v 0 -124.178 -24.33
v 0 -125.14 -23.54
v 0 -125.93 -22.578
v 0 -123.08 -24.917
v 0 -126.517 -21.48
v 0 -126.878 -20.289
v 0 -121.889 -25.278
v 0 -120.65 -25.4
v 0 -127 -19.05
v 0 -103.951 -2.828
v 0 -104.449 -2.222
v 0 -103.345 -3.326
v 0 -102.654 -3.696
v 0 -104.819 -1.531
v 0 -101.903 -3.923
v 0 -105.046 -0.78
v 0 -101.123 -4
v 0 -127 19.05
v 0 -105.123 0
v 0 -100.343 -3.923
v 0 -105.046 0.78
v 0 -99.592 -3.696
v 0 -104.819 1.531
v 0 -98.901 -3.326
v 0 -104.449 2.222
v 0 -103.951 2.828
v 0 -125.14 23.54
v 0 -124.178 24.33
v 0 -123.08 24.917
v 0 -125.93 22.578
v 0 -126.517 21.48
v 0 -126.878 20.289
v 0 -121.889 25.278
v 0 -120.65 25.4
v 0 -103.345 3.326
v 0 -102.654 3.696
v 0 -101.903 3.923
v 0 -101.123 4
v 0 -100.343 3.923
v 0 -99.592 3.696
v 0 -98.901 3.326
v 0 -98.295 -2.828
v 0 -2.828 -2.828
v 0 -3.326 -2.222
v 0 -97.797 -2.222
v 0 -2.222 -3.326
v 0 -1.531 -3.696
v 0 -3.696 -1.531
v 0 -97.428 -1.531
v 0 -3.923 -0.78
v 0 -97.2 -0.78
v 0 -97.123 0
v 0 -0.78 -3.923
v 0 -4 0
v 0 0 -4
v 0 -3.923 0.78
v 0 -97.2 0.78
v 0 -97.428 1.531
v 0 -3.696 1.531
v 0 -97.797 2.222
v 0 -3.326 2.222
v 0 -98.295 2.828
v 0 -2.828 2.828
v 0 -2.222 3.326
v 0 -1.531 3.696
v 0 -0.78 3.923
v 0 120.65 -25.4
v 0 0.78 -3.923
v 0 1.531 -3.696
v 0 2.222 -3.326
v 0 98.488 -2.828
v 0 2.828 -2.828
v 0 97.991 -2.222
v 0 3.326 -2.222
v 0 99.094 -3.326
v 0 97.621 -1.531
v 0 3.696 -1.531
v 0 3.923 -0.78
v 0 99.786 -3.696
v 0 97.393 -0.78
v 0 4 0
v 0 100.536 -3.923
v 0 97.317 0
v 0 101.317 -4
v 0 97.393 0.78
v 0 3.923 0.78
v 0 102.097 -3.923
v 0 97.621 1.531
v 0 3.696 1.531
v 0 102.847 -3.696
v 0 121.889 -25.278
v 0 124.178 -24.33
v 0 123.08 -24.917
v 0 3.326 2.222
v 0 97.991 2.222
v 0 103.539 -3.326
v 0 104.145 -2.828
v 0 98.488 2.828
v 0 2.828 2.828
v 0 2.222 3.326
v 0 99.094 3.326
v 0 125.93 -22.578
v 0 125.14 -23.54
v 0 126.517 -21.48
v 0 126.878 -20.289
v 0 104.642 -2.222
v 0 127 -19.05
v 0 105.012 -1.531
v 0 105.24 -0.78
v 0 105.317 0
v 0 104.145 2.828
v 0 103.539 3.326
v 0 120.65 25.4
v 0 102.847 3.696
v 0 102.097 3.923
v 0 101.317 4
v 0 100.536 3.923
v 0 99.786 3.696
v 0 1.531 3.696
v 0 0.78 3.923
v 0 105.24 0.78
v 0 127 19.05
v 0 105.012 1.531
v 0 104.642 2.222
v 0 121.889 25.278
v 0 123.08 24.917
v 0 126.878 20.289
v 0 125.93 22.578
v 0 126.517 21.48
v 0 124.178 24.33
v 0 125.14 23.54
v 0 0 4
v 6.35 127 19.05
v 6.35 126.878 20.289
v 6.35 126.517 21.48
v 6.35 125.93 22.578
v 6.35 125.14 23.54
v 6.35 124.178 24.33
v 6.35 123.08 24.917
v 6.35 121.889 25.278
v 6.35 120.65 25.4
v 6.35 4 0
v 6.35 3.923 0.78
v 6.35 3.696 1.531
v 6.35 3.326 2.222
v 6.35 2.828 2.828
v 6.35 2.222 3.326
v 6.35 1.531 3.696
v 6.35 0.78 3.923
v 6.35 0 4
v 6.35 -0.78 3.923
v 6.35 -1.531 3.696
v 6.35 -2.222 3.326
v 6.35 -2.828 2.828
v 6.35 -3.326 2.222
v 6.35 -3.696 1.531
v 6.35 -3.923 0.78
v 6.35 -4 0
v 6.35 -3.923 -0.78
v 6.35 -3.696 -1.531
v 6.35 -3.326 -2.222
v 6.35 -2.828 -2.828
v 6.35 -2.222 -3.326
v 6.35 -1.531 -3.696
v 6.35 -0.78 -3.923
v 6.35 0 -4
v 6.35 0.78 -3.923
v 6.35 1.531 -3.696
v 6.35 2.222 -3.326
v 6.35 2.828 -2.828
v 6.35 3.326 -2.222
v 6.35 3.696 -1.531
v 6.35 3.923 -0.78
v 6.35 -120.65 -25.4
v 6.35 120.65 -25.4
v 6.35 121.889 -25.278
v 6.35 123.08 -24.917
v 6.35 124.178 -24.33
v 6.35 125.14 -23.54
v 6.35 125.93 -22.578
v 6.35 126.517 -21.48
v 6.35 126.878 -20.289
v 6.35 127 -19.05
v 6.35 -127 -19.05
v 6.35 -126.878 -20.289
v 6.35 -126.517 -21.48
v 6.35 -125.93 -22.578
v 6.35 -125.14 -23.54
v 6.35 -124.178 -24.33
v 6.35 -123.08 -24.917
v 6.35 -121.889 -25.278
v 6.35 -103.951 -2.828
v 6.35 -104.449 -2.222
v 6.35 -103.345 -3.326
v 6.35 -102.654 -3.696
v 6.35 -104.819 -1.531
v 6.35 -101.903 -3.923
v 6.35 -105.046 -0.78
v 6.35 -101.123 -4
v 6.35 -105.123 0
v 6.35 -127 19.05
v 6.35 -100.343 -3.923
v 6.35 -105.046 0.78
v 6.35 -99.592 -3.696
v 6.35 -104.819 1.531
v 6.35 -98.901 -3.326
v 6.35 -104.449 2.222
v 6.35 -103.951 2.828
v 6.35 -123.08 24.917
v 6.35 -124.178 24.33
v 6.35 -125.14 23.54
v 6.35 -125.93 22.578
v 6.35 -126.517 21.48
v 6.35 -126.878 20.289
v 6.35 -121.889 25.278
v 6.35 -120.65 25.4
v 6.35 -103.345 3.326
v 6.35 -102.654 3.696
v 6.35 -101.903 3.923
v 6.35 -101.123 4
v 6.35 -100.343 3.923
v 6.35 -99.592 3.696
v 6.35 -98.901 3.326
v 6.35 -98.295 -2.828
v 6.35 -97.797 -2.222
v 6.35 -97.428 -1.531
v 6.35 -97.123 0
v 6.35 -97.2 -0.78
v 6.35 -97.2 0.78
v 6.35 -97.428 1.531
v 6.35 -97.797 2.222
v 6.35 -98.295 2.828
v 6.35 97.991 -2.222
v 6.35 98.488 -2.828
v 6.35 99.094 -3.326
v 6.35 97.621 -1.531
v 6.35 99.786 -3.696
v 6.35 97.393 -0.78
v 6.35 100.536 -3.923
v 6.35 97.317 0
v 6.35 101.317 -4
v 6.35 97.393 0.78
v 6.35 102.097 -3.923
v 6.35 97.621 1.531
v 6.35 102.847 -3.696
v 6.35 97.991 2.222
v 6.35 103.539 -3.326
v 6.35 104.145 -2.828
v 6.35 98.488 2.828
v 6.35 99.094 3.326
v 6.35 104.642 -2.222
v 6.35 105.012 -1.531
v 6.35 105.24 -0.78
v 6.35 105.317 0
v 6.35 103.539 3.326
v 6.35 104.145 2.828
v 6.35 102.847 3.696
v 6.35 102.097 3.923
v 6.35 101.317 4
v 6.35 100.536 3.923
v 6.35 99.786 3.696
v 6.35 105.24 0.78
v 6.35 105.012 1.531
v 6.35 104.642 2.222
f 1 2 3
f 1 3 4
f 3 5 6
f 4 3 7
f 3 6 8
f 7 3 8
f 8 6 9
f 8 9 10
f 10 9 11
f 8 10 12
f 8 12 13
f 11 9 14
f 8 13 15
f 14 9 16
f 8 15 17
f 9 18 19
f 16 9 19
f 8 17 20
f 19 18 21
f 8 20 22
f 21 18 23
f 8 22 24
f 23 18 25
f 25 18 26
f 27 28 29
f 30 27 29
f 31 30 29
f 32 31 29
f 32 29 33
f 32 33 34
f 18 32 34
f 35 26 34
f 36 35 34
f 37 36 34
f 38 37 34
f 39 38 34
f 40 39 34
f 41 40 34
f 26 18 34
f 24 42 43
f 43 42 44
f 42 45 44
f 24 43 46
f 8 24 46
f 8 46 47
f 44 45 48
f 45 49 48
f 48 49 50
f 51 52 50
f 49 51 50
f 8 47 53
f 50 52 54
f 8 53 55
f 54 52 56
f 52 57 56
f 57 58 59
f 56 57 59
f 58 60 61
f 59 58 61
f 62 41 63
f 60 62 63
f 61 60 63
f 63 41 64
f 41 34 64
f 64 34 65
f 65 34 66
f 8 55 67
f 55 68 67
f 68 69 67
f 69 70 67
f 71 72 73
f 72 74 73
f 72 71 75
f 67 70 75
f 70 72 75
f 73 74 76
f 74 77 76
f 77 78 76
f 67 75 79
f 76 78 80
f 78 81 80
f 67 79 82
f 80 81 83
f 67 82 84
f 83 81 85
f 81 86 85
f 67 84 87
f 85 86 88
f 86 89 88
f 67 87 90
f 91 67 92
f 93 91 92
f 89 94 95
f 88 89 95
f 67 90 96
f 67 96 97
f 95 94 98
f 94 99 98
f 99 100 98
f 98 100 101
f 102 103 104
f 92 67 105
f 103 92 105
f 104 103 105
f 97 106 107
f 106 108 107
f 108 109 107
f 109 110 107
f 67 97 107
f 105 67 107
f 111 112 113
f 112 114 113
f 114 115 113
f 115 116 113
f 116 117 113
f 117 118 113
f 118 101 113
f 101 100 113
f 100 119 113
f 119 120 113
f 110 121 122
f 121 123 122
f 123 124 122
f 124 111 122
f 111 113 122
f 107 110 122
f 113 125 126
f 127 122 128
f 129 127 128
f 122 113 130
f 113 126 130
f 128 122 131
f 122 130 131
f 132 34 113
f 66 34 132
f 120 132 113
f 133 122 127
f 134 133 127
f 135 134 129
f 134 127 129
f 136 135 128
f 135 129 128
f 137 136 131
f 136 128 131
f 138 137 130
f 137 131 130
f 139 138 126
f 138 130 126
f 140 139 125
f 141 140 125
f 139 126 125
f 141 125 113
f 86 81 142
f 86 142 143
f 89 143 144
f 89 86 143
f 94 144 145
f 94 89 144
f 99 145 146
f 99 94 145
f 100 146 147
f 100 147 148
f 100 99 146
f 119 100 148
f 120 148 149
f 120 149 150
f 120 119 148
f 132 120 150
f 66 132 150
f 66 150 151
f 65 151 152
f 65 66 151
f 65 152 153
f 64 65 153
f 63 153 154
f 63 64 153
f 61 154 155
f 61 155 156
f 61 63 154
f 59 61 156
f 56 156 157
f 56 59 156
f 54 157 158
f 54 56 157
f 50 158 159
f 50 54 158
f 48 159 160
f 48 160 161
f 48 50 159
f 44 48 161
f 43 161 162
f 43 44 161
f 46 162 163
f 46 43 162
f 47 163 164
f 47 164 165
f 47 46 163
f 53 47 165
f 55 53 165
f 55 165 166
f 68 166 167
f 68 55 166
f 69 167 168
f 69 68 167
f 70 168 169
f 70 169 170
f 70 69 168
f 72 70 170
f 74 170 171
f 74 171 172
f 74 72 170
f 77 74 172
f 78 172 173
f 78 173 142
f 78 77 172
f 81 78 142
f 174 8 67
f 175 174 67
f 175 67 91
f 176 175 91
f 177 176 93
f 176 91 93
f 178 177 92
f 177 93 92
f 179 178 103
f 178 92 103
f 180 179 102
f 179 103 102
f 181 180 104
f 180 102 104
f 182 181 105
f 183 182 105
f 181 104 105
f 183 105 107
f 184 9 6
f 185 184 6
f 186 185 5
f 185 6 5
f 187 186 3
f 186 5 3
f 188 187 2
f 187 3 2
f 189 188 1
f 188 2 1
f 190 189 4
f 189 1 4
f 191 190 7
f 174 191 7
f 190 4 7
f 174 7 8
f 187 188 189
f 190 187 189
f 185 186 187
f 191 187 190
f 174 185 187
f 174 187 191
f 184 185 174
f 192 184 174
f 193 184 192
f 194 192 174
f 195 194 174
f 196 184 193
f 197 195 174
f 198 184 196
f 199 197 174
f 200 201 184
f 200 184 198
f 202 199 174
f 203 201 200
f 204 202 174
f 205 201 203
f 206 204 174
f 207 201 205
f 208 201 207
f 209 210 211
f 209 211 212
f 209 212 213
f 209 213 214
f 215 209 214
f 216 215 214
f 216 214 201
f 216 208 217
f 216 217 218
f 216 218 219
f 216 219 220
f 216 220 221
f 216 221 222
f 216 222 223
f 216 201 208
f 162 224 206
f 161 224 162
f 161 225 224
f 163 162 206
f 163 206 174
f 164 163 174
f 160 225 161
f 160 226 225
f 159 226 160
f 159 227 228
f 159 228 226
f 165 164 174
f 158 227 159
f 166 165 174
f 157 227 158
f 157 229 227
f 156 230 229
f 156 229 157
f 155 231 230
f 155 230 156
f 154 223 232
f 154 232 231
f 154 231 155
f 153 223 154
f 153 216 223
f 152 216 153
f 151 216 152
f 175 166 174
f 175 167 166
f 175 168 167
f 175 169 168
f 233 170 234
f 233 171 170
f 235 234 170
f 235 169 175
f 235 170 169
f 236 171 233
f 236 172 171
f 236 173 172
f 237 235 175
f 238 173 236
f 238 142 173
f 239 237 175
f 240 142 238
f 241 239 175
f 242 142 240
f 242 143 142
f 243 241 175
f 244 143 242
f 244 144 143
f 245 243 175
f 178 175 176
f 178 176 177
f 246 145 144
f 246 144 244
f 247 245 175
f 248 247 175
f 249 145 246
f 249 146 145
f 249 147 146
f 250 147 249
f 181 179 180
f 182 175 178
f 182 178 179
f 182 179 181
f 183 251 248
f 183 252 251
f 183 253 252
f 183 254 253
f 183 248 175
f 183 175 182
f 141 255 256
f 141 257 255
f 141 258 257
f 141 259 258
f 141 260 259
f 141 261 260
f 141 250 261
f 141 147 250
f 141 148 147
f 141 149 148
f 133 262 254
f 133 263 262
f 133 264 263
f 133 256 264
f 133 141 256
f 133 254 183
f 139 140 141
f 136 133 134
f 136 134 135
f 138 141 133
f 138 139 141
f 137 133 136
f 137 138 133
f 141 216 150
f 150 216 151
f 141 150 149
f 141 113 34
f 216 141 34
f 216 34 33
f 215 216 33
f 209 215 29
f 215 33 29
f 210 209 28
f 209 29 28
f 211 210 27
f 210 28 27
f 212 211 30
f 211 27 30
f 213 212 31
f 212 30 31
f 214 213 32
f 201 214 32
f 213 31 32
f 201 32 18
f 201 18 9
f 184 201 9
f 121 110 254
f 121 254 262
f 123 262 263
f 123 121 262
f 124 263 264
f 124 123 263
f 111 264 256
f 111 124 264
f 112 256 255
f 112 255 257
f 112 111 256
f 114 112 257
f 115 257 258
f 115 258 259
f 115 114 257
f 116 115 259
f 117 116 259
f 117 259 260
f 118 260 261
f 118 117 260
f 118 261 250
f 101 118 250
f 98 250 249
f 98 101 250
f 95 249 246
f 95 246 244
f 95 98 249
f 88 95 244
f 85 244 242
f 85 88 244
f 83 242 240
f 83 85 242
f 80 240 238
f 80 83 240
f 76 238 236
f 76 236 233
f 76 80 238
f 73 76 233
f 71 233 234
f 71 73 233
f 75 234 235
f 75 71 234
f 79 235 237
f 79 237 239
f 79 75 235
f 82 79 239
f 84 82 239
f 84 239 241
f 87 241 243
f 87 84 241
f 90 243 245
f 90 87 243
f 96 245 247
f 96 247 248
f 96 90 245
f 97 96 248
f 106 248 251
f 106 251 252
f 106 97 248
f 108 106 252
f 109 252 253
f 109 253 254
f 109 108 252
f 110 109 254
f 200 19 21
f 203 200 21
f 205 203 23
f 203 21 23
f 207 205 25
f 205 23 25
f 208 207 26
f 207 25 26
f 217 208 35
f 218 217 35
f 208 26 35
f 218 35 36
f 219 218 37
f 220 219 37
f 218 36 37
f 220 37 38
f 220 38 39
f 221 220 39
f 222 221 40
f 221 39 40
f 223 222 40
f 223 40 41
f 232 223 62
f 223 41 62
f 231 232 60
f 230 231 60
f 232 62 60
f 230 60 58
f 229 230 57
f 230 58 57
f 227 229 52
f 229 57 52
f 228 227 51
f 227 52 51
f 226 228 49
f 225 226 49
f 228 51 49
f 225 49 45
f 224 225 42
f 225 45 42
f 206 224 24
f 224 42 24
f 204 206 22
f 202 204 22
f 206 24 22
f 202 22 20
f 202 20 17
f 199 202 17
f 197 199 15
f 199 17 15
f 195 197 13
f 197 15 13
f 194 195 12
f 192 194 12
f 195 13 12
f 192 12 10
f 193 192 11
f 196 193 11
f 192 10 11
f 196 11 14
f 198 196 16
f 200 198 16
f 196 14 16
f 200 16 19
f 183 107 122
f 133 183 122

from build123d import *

# Parameters (mm, degrees)
F0_R     = 4
F1_DEPTH = 6.35


with BuildPart() as f1:
    # F0 (on Right) → F1 (new body)
    with BuildSketch(Plane.YZ):
        with BuildLine():
            Line((120.65, 25.4), (-120.65, 25.4))
            ThreePointArc((-120.65, 25.4), (-125.140128, 23.540128), (-127, 19.05))
            Line((-127, 19.05), (-127, 0))
            Line((-127, 0), (-127, -19.05))
            ThreePointArc((-127, -19.05), (-125.140128, -23.540128), (-120.65, -25.4))
            Line((-120.65, -25.4), (120.65, -25.4))
            ThreePointArc((120.65, -25.4), (125.140128, -23.540128), (127, -19.05))
            Line((127, -19.05), (127, 0))
            Line((127, 0), (127, 19.05))
            ThreePointArc((127, 19.05), (125.140128, 23.540128), (120.65, 25.4))
        make_face()
        with BuildLine():
            ThreePointArc((-97.123065, 0), (-101.123065, -4), (-105.123065, 0))
            ThreePointArc((-105.123065, 0), (-101.123065, 4), (-97.123065, 0))
        make_face(mode=Mode.SUBTRACT)
        Circle(F0_R, mode=Mode.SUBTRACT)
        with Locations((101.316608, 0)):
            Circle(F0_R, mode=Mode.SUBTRACT)
    extrude(amount=F1_DEPTH)


solid = f1.part
